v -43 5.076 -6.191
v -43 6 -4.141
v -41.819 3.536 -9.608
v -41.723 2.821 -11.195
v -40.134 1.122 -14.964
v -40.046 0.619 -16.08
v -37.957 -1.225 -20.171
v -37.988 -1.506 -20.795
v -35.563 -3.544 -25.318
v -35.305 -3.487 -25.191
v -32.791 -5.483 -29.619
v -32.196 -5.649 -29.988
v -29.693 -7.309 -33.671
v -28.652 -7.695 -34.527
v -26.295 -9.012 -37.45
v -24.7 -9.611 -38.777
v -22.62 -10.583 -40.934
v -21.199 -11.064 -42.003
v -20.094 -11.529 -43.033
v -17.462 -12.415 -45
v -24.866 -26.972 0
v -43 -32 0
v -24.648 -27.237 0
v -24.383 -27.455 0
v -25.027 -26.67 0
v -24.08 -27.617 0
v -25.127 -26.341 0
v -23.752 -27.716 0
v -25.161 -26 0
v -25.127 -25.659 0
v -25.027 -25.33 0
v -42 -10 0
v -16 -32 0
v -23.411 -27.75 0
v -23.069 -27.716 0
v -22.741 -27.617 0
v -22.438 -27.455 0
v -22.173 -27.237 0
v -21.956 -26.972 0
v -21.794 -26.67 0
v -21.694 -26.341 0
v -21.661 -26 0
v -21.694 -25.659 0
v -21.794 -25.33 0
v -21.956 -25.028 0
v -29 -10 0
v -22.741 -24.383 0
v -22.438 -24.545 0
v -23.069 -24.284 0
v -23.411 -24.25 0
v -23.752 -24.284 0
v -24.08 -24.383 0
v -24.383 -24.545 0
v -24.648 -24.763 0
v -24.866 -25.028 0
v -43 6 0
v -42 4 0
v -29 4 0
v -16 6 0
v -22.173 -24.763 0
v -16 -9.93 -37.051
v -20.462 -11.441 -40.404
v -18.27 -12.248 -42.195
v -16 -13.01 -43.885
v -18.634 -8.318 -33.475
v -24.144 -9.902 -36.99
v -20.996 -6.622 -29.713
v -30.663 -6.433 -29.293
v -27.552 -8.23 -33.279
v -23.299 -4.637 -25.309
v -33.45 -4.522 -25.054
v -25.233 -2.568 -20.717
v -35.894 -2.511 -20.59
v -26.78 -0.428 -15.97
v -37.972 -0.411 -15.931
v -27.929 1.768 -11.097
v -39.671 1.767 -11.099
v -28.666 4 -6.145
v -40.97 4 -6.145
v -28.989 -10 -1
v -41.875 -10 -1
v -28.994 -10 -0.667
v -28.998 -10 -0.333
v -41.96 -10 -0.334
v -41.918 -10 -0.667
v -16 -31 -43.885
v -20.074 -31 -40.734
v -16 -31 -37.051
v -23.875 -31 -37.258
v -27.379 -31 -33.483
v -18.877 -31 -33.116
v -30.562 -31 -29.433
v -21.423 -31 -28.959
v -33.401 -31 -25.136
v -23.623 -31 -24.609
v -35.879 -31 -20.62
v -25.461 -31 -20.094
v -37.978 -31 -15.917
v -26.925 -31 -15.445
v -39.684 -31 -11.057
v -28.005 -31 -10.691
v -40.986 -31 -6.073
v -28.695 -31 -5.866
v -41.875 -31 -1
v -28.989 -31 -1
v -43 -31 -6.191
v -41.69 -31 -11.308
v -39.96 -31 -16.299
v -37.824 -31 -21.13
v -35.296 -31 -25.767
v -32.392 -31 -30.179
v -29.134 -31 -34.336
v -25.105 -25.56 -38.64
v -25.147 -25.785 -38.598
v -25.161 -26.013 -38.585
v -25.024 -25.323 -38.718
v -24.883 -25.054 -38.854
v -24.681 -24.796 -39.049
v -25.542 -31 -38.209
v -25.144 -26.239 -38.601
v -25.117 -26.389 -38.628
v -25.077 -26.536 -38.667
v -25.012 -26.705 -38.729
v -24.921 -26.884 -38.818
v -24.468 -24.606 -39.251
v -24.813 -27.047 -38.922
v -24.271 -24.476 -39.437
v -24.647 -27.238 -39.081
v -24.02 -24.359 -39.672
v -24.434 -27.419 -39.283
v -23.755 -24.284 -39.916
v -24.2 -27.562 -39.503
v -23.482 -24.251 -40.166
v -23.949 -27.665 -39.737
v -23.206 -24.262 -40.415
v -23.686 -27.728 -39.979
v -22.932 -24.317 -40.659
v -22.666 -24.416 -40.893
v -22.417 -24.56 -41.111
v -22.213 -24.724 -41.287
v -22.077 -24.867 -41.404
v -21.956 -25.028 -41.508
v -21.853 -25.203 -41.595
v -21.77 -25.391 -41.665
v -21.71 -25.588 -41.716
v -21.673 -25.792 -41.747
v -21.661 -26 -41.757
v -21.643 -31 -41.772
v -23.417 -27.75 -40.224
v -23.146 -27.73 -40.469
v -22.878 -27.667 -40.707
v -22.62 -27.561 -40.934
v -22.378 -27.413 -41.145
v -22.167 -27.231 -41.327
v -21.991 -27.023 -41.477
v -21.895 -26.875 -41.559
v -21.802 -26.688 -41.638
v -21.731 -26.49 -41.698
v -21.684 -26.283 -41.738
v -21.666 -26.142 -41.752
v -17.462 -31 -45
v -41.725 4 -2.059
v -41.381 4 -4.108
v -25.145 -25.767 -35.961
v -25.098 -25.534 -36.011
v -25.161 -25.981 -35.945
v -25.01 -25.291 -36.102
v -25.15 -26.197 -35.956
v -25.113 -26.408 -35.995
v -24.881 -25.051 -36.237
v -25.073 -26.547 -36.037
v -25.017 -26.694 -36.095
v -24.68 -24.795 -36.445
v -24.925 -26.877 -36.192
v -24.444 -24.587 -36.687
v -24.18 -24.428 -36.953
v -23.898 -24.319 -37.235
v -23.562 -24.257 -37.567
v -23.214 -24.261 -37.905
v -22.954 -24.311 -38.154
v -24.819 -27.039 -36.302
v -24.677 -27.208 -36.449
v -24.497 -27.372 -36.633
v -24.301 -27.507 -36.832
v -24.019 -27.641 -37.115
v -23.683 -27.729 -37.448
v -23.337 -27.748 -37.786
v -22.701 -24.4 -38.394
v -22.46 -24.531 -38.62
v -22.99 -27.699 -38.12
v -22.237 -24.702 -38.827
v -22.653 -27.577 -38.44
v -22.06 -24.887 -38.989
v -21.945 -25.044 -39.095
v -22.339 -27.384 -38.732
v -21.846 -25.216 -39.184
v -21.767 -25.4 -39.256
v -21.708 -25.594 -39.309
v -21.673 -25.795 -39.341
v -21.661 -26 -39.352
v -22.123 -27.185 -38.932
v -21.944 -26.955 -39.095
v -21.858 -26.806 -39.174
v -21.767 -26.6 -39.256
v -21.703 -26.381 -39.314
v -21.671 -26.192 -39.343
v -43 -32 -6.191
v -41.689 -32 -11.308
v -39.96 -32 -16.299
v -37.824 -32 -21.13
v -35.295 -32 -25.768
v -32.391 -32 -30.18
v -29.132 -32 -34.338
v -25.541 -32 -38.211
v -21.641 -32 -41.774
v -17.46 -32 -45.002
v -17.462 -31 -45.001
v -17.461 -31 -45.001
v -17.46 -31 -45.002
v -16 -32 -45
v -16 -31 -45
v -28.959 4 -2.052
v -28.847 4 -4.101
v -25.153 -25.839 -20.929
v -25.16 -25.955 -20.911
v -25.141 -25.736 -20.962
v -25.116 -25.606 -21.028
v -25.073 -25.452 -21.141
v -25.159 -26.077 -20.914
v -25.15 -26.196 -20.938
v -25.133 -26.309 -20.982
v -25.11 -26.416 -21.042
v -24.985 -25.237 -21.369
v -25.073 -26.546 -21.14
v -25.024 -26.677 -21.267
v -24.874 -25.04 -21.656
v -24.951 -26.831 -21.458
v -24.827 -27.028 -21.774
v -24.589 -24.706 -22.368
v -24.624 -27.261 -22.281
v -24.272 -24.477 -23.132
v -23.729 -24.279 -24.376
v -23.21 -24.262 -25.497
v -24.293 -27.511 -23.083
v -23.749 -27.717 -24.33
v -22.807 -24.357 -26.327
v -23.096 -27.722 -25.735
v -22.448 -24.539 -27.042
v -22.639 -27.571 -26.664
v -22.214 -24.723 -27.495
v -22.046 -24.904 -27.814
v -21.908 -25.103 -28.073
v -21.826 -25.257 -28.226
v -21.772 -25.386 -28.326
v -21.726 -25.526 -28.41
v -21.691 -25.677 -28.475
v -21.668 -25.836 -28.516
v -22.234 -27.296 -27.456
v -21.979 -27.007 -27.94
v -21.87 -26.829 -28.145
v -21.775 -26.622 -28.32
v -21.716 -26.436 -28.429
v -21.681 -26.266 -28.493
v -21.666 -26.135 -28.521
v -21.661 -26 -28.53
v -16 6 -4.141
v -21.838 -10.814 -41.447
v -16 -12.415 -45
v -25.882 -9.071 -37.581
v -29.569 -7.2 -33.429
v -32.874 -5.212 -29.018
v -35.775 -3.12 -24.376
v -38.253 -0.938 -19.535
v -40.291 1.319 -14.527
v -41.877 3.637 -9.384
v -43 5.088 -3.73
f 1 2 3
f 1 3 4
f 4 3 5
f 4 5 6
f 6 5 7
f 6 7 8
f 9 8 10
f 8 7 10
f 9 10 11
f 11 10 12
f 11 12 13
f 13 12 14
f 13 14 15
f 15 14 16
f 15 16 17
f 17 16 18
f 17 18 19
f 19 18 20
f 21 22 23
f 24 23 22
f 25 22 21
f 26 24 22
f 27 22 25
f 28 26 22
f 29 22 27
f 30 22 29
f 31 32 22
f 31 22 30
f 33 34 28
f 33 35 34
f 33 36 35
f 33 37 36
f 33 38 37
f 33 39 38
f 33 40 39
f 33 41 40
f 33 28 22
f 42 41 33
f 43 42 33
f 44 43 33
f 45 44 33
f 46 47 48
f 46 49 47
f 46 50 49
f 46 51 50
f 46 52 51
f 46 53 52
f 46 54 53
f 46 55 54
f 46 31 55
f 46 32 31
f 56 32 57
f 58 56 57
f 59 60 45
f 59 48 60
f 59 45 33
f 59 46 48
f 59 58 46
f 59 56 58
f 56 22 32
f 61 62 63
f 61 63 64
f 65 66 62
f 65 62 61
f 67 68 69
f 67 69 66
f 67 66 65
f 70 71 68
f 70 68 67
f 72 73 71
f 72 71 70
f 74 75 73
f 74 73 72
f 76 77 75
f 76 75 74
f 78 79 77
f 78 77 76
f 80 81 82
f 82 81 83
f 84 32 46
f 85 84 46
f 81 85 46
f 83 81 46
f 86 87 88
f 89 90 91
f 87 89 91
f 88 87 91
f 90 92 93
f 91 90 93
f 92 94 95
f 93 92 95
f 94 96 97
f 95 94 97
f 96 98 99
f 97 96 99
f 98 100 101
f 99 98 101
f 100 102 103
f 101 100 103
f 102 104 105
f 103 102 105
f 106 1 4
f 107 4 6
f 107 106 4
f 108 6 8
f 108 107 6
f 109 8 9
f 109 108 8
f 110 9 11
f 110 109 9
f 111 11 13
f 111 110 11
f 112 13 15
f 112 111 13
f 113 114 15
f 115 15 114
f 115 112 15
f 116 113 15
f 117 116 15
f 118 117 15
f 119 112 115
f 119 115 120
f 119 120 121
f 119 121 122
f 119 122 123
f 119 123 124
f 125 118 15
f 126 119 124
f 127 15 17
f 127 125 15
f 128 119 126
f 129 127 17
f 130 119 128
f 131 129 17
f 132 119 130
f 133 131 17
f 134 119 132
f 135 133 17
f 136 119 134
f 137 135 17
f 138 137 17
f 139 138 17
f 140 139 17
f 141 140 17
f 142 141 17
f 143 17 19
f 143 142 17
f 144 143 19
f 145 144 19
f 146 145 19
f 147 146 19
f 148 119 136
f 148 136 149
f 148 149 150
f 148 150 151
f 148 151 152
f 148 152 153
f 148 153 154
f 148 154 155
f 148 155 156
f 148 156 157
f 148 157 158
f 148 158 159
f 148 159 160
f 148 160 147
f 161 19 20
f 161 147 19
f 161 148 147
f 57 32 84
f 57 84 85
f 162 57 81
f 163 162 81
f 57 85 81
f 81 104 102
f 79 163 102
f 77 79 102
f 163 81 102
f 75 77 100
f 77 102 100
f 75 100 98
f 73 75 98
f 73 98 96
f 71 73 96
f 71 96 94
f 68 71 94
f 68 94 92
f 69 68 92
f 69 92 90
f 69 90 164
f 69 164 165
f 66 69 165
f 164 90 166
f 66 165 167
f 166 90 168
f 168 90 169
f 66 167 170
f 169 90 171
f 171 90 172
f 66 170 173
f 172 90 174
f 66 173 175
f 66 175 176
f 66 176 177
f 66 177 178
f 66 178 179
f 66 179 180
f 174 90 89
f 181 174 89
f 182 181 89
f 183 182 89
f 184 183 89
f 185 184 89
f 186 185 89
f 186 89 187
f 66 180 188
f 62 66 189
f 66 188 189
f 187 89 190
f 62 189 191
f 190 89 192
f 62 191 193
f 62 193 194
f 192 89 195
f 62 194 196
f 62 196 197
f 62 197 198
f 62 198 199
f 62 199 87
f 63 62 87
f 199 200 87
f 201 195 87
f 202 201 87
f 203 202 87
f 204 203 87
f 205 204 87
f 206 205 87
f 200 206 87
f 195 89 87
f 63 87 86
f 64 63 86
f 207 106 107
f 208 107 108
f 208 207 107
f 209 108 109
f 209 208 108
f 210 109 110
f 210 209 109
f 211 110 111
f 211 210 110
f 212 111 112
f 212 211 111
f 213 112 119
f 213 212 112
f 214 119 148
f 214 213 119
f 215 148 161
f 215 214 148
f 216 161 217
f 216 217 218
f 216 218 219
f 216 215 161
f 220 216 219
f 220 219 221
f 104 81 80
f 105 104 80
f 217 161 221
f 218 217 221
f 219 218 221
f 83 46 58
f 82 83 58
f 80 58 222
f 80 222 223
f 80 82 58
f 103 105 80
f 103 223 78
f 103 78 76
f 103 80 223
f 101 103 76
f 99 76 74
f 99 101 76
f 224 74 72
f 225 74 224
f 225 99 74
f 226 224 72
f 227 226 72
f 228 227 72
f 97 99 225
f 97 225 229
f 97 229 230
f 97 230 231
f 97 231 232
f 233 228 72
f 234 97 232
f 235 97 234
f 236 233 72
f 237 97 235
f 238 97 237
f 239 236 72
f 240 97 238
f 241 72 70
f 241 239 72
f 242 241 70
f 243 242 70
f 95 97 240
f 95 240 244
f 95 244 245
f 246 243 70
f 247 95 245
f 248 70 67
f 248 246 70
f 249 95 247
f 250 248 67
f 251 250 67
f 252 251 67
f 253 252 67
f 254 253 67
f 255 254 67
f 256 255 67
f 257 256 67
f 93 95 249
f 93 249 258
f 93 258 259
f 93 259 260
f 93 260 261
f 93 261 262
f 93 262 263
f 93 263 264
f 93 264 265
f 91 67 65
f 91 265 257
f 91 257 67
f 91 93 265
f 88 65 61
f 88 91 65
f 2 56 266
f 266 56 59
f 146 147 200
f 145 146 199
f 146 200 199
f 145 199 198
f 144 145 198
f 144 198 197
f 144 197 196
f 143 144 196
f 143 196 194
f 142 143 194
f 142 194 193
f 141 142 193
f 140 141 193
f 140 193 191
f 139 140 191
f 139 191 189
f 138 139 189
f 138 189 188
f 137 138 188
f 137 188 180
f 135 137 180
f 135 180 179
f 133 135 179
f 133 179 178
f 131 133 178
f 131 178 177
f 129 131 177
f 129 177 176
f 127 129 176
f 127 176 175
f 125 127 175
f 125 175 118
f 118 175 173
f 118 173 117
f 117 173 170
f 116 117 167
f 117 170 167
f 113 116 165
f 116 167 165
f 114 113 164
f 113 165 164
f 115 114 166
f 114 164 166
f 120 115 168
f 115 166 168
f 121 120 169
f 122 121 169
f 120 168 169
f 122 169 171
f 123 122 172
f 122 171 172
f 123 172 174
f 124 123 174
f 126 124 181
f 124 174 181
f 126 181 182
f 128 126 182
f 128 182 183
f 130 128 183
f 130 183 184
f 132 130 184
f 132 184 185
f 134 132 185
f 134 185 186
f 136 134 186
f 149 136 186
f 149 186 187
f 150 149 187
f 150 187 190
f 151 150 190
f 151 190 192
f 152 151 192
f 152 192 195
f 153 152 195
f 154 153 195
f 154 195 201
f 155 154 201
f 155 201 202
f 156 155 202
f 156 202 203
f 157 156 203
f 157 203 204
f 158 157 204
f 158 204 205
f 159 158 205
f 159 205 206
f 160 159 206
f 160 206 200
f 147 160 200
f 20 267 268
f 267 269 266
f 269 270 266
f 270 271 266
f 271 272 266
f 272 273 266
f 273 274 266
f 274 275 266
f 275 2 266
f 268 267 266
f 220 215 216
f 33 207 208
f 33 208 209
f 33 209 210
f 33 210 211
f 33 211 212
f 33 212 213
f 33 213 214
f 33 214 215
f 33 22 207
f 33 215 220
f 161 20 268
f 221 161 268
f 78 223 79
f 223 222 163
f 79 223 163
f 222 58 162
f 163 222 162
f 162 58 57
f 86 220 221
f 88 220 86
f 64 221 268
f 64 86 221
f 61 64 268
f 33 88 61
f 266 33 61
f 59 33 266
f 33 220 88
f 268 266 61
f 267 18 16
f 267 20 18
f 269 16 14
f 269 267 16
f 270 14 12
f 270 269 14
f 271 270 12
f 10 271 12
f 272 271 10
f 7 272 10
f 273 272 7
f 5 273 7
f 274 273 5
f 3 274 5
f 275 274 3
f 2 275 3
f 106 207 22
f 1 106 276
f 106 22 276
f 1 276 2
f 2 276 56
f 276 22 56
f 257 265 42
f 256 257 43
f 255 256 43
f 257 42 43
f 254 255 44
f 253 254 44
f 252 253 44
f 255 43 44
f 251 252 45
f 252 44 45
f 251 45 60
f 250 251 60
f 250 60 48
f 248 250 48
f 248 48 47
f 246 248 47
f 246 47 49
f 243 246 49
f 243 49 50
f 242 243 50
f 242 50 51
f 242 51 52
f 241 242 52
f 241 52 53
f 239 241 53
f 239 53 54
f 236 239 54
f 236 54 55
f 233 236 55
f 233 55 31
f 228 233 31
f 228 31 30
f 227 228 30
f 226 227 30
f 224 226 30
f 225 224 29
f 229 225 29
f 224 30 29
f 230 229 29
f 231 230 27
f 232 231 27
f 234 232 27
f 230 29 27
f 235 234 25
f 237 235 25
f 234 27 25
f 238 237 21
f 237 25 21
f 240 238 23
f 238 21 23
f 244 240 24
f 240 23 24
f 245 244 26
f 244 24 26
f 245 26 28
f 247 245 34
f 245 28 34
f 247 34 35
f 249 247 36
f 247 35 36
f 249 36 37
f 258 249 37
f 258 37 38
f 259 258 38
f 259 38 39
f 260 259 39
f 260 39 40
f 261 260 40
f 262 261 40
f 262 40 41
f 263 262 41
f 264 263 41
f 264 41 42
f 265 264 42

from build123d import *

# Parameters (mm, degrees)
SKETCH_W        = 27
SKETCH_H        = 38
PAD_DEPTH       = 45
POCKET_DEPTH    = 38.001
POCKET001_DEPTH = 36
POCKET002_DEPTH = 27.001
PAD001_DEPTH    = 1
PAD002_DEPTH    = 1
SKETCH008_W     = 27
SKETCH008_H     = 22
PAD003_DEPTH    = 1
SKETCH009_R     = 1.75
POCKET003_DEPTH = 45.002679


with BuildPart() as part:
    # Sketch → Pad (new body)
    with BuildSketch(Plane.XY):
        with Locations((-29.5, -13)):
            Rectangle(SKETCH_W, SKETCH_H)
    extrude(amount=-PAD_DEPTH)

    # Sketch003 (on Face2 of Pad) → Pocket (cut, through all)
    with BuildSketch(Plane.XZ.offset(32)):
        with BuildLine():
            ThreePointArc((-44, 0), (-34.593948, -26.908525), (-14.407019, -47.033892))
            Line((-14.407019, -47.033892), (-67.061646, -46.193626))
            Line((-67.061646, -46.193626), (-44, 0))
        make_face()
    extrude(amount=-POCKET_DEPTH, mode=Mode.SUBTRACT)

    # Sketch004 (on Face3 of Pocket) → Pocket001 (cut)
    with BuildSketch(Plane.XZ.offset(32)):
        with BuildLine():
            ThreePointArc((-29, 0), (-23.639101, -24.573945), (-8.645898, -44.768545))
            Line((-8.645898, -44.768545), (-11.371384, -46.875244))
            ThreePointArc((-42, 0), (-32.20336, -27.042905), (-11.371384, -46.875244))
            Line((-29, 0), (-42, 0))
        make_face()
    extrude(amount=-POCKET001_DEPTH, mode=Mode.SUBTRACT)

    # Sketch005 (on Face1 of Pocket001) → Pocket002 (cut, through all)
    with BuildSketch(Plane.YZ.offset(-16)):
        Polygon((15.686372, 17.350435), (-17.648283, -56.610836), (15.686372, -59.996391), align=None)
    extrude(amount=-POCKET002_DEPTH, mode=Mode.SUBTRACT)

    # Sketch006 (on Face3 of Pocket002) → Pad001 (join)
    with BuildSketch(Plane.XZ.offset(32)):
        with BuildLine():
            ThreePointArc((-43, -6.191343), (-33.888802, -28.004267), (-17.459999, -45.001679))
            Line((-17.459999, -45.001679), (-16, -45))
            Line((-16, 0), (-16, -45))
            Line((-43, 0), (-16, 0))
            Line((-43, -6.191343), (-43, 0))
        make_face()
    extrude(amount=-PAD001_DEPTH)

    # Sketch007 (on Face5 of Pad001) → Pad002 (join)
    with BuildSketch(Plane(origin=(0, 6.538304, -2.946841), x_dir=(-1, 0, 0), z_dir=(0, 0.911681, -0.410898))):
        with BuildLine():
            Line((16, -1.310067), (43, -1.310067))
            ThreePointArc((17.46237, -46.127049), (34.375924, -26.080314), (43, -1.310067))
            Line((16, -46.127049), (17.46237, -46.127049))
            Line((16, -1.310067), (16, -46.127049))
        make_face()
    extrude(amount=-PAD002_DEPTH)

    # Sketch008 (on Face2 of Pad002) → Pad003 (join)
    with BuildSketch(Plane.XY):
        with Locations((-29.5, -21)):
            Rectangle(SKETCH008_W, SKETCH008_H)
    extrude(amount=-PAD003_DEPTH)

    # Sketch009 (on Face2 of Pad003) → Pocket003 (cut, through all)
    with BuildSketch(Plane.XY):
        with Locations((-23.410666, -26)):
            Circle(SKETCH009_R)
    extrude(amount=-POCKET003_DEPTH, mode=Mode.SUBTRACT)


solid = part.part
